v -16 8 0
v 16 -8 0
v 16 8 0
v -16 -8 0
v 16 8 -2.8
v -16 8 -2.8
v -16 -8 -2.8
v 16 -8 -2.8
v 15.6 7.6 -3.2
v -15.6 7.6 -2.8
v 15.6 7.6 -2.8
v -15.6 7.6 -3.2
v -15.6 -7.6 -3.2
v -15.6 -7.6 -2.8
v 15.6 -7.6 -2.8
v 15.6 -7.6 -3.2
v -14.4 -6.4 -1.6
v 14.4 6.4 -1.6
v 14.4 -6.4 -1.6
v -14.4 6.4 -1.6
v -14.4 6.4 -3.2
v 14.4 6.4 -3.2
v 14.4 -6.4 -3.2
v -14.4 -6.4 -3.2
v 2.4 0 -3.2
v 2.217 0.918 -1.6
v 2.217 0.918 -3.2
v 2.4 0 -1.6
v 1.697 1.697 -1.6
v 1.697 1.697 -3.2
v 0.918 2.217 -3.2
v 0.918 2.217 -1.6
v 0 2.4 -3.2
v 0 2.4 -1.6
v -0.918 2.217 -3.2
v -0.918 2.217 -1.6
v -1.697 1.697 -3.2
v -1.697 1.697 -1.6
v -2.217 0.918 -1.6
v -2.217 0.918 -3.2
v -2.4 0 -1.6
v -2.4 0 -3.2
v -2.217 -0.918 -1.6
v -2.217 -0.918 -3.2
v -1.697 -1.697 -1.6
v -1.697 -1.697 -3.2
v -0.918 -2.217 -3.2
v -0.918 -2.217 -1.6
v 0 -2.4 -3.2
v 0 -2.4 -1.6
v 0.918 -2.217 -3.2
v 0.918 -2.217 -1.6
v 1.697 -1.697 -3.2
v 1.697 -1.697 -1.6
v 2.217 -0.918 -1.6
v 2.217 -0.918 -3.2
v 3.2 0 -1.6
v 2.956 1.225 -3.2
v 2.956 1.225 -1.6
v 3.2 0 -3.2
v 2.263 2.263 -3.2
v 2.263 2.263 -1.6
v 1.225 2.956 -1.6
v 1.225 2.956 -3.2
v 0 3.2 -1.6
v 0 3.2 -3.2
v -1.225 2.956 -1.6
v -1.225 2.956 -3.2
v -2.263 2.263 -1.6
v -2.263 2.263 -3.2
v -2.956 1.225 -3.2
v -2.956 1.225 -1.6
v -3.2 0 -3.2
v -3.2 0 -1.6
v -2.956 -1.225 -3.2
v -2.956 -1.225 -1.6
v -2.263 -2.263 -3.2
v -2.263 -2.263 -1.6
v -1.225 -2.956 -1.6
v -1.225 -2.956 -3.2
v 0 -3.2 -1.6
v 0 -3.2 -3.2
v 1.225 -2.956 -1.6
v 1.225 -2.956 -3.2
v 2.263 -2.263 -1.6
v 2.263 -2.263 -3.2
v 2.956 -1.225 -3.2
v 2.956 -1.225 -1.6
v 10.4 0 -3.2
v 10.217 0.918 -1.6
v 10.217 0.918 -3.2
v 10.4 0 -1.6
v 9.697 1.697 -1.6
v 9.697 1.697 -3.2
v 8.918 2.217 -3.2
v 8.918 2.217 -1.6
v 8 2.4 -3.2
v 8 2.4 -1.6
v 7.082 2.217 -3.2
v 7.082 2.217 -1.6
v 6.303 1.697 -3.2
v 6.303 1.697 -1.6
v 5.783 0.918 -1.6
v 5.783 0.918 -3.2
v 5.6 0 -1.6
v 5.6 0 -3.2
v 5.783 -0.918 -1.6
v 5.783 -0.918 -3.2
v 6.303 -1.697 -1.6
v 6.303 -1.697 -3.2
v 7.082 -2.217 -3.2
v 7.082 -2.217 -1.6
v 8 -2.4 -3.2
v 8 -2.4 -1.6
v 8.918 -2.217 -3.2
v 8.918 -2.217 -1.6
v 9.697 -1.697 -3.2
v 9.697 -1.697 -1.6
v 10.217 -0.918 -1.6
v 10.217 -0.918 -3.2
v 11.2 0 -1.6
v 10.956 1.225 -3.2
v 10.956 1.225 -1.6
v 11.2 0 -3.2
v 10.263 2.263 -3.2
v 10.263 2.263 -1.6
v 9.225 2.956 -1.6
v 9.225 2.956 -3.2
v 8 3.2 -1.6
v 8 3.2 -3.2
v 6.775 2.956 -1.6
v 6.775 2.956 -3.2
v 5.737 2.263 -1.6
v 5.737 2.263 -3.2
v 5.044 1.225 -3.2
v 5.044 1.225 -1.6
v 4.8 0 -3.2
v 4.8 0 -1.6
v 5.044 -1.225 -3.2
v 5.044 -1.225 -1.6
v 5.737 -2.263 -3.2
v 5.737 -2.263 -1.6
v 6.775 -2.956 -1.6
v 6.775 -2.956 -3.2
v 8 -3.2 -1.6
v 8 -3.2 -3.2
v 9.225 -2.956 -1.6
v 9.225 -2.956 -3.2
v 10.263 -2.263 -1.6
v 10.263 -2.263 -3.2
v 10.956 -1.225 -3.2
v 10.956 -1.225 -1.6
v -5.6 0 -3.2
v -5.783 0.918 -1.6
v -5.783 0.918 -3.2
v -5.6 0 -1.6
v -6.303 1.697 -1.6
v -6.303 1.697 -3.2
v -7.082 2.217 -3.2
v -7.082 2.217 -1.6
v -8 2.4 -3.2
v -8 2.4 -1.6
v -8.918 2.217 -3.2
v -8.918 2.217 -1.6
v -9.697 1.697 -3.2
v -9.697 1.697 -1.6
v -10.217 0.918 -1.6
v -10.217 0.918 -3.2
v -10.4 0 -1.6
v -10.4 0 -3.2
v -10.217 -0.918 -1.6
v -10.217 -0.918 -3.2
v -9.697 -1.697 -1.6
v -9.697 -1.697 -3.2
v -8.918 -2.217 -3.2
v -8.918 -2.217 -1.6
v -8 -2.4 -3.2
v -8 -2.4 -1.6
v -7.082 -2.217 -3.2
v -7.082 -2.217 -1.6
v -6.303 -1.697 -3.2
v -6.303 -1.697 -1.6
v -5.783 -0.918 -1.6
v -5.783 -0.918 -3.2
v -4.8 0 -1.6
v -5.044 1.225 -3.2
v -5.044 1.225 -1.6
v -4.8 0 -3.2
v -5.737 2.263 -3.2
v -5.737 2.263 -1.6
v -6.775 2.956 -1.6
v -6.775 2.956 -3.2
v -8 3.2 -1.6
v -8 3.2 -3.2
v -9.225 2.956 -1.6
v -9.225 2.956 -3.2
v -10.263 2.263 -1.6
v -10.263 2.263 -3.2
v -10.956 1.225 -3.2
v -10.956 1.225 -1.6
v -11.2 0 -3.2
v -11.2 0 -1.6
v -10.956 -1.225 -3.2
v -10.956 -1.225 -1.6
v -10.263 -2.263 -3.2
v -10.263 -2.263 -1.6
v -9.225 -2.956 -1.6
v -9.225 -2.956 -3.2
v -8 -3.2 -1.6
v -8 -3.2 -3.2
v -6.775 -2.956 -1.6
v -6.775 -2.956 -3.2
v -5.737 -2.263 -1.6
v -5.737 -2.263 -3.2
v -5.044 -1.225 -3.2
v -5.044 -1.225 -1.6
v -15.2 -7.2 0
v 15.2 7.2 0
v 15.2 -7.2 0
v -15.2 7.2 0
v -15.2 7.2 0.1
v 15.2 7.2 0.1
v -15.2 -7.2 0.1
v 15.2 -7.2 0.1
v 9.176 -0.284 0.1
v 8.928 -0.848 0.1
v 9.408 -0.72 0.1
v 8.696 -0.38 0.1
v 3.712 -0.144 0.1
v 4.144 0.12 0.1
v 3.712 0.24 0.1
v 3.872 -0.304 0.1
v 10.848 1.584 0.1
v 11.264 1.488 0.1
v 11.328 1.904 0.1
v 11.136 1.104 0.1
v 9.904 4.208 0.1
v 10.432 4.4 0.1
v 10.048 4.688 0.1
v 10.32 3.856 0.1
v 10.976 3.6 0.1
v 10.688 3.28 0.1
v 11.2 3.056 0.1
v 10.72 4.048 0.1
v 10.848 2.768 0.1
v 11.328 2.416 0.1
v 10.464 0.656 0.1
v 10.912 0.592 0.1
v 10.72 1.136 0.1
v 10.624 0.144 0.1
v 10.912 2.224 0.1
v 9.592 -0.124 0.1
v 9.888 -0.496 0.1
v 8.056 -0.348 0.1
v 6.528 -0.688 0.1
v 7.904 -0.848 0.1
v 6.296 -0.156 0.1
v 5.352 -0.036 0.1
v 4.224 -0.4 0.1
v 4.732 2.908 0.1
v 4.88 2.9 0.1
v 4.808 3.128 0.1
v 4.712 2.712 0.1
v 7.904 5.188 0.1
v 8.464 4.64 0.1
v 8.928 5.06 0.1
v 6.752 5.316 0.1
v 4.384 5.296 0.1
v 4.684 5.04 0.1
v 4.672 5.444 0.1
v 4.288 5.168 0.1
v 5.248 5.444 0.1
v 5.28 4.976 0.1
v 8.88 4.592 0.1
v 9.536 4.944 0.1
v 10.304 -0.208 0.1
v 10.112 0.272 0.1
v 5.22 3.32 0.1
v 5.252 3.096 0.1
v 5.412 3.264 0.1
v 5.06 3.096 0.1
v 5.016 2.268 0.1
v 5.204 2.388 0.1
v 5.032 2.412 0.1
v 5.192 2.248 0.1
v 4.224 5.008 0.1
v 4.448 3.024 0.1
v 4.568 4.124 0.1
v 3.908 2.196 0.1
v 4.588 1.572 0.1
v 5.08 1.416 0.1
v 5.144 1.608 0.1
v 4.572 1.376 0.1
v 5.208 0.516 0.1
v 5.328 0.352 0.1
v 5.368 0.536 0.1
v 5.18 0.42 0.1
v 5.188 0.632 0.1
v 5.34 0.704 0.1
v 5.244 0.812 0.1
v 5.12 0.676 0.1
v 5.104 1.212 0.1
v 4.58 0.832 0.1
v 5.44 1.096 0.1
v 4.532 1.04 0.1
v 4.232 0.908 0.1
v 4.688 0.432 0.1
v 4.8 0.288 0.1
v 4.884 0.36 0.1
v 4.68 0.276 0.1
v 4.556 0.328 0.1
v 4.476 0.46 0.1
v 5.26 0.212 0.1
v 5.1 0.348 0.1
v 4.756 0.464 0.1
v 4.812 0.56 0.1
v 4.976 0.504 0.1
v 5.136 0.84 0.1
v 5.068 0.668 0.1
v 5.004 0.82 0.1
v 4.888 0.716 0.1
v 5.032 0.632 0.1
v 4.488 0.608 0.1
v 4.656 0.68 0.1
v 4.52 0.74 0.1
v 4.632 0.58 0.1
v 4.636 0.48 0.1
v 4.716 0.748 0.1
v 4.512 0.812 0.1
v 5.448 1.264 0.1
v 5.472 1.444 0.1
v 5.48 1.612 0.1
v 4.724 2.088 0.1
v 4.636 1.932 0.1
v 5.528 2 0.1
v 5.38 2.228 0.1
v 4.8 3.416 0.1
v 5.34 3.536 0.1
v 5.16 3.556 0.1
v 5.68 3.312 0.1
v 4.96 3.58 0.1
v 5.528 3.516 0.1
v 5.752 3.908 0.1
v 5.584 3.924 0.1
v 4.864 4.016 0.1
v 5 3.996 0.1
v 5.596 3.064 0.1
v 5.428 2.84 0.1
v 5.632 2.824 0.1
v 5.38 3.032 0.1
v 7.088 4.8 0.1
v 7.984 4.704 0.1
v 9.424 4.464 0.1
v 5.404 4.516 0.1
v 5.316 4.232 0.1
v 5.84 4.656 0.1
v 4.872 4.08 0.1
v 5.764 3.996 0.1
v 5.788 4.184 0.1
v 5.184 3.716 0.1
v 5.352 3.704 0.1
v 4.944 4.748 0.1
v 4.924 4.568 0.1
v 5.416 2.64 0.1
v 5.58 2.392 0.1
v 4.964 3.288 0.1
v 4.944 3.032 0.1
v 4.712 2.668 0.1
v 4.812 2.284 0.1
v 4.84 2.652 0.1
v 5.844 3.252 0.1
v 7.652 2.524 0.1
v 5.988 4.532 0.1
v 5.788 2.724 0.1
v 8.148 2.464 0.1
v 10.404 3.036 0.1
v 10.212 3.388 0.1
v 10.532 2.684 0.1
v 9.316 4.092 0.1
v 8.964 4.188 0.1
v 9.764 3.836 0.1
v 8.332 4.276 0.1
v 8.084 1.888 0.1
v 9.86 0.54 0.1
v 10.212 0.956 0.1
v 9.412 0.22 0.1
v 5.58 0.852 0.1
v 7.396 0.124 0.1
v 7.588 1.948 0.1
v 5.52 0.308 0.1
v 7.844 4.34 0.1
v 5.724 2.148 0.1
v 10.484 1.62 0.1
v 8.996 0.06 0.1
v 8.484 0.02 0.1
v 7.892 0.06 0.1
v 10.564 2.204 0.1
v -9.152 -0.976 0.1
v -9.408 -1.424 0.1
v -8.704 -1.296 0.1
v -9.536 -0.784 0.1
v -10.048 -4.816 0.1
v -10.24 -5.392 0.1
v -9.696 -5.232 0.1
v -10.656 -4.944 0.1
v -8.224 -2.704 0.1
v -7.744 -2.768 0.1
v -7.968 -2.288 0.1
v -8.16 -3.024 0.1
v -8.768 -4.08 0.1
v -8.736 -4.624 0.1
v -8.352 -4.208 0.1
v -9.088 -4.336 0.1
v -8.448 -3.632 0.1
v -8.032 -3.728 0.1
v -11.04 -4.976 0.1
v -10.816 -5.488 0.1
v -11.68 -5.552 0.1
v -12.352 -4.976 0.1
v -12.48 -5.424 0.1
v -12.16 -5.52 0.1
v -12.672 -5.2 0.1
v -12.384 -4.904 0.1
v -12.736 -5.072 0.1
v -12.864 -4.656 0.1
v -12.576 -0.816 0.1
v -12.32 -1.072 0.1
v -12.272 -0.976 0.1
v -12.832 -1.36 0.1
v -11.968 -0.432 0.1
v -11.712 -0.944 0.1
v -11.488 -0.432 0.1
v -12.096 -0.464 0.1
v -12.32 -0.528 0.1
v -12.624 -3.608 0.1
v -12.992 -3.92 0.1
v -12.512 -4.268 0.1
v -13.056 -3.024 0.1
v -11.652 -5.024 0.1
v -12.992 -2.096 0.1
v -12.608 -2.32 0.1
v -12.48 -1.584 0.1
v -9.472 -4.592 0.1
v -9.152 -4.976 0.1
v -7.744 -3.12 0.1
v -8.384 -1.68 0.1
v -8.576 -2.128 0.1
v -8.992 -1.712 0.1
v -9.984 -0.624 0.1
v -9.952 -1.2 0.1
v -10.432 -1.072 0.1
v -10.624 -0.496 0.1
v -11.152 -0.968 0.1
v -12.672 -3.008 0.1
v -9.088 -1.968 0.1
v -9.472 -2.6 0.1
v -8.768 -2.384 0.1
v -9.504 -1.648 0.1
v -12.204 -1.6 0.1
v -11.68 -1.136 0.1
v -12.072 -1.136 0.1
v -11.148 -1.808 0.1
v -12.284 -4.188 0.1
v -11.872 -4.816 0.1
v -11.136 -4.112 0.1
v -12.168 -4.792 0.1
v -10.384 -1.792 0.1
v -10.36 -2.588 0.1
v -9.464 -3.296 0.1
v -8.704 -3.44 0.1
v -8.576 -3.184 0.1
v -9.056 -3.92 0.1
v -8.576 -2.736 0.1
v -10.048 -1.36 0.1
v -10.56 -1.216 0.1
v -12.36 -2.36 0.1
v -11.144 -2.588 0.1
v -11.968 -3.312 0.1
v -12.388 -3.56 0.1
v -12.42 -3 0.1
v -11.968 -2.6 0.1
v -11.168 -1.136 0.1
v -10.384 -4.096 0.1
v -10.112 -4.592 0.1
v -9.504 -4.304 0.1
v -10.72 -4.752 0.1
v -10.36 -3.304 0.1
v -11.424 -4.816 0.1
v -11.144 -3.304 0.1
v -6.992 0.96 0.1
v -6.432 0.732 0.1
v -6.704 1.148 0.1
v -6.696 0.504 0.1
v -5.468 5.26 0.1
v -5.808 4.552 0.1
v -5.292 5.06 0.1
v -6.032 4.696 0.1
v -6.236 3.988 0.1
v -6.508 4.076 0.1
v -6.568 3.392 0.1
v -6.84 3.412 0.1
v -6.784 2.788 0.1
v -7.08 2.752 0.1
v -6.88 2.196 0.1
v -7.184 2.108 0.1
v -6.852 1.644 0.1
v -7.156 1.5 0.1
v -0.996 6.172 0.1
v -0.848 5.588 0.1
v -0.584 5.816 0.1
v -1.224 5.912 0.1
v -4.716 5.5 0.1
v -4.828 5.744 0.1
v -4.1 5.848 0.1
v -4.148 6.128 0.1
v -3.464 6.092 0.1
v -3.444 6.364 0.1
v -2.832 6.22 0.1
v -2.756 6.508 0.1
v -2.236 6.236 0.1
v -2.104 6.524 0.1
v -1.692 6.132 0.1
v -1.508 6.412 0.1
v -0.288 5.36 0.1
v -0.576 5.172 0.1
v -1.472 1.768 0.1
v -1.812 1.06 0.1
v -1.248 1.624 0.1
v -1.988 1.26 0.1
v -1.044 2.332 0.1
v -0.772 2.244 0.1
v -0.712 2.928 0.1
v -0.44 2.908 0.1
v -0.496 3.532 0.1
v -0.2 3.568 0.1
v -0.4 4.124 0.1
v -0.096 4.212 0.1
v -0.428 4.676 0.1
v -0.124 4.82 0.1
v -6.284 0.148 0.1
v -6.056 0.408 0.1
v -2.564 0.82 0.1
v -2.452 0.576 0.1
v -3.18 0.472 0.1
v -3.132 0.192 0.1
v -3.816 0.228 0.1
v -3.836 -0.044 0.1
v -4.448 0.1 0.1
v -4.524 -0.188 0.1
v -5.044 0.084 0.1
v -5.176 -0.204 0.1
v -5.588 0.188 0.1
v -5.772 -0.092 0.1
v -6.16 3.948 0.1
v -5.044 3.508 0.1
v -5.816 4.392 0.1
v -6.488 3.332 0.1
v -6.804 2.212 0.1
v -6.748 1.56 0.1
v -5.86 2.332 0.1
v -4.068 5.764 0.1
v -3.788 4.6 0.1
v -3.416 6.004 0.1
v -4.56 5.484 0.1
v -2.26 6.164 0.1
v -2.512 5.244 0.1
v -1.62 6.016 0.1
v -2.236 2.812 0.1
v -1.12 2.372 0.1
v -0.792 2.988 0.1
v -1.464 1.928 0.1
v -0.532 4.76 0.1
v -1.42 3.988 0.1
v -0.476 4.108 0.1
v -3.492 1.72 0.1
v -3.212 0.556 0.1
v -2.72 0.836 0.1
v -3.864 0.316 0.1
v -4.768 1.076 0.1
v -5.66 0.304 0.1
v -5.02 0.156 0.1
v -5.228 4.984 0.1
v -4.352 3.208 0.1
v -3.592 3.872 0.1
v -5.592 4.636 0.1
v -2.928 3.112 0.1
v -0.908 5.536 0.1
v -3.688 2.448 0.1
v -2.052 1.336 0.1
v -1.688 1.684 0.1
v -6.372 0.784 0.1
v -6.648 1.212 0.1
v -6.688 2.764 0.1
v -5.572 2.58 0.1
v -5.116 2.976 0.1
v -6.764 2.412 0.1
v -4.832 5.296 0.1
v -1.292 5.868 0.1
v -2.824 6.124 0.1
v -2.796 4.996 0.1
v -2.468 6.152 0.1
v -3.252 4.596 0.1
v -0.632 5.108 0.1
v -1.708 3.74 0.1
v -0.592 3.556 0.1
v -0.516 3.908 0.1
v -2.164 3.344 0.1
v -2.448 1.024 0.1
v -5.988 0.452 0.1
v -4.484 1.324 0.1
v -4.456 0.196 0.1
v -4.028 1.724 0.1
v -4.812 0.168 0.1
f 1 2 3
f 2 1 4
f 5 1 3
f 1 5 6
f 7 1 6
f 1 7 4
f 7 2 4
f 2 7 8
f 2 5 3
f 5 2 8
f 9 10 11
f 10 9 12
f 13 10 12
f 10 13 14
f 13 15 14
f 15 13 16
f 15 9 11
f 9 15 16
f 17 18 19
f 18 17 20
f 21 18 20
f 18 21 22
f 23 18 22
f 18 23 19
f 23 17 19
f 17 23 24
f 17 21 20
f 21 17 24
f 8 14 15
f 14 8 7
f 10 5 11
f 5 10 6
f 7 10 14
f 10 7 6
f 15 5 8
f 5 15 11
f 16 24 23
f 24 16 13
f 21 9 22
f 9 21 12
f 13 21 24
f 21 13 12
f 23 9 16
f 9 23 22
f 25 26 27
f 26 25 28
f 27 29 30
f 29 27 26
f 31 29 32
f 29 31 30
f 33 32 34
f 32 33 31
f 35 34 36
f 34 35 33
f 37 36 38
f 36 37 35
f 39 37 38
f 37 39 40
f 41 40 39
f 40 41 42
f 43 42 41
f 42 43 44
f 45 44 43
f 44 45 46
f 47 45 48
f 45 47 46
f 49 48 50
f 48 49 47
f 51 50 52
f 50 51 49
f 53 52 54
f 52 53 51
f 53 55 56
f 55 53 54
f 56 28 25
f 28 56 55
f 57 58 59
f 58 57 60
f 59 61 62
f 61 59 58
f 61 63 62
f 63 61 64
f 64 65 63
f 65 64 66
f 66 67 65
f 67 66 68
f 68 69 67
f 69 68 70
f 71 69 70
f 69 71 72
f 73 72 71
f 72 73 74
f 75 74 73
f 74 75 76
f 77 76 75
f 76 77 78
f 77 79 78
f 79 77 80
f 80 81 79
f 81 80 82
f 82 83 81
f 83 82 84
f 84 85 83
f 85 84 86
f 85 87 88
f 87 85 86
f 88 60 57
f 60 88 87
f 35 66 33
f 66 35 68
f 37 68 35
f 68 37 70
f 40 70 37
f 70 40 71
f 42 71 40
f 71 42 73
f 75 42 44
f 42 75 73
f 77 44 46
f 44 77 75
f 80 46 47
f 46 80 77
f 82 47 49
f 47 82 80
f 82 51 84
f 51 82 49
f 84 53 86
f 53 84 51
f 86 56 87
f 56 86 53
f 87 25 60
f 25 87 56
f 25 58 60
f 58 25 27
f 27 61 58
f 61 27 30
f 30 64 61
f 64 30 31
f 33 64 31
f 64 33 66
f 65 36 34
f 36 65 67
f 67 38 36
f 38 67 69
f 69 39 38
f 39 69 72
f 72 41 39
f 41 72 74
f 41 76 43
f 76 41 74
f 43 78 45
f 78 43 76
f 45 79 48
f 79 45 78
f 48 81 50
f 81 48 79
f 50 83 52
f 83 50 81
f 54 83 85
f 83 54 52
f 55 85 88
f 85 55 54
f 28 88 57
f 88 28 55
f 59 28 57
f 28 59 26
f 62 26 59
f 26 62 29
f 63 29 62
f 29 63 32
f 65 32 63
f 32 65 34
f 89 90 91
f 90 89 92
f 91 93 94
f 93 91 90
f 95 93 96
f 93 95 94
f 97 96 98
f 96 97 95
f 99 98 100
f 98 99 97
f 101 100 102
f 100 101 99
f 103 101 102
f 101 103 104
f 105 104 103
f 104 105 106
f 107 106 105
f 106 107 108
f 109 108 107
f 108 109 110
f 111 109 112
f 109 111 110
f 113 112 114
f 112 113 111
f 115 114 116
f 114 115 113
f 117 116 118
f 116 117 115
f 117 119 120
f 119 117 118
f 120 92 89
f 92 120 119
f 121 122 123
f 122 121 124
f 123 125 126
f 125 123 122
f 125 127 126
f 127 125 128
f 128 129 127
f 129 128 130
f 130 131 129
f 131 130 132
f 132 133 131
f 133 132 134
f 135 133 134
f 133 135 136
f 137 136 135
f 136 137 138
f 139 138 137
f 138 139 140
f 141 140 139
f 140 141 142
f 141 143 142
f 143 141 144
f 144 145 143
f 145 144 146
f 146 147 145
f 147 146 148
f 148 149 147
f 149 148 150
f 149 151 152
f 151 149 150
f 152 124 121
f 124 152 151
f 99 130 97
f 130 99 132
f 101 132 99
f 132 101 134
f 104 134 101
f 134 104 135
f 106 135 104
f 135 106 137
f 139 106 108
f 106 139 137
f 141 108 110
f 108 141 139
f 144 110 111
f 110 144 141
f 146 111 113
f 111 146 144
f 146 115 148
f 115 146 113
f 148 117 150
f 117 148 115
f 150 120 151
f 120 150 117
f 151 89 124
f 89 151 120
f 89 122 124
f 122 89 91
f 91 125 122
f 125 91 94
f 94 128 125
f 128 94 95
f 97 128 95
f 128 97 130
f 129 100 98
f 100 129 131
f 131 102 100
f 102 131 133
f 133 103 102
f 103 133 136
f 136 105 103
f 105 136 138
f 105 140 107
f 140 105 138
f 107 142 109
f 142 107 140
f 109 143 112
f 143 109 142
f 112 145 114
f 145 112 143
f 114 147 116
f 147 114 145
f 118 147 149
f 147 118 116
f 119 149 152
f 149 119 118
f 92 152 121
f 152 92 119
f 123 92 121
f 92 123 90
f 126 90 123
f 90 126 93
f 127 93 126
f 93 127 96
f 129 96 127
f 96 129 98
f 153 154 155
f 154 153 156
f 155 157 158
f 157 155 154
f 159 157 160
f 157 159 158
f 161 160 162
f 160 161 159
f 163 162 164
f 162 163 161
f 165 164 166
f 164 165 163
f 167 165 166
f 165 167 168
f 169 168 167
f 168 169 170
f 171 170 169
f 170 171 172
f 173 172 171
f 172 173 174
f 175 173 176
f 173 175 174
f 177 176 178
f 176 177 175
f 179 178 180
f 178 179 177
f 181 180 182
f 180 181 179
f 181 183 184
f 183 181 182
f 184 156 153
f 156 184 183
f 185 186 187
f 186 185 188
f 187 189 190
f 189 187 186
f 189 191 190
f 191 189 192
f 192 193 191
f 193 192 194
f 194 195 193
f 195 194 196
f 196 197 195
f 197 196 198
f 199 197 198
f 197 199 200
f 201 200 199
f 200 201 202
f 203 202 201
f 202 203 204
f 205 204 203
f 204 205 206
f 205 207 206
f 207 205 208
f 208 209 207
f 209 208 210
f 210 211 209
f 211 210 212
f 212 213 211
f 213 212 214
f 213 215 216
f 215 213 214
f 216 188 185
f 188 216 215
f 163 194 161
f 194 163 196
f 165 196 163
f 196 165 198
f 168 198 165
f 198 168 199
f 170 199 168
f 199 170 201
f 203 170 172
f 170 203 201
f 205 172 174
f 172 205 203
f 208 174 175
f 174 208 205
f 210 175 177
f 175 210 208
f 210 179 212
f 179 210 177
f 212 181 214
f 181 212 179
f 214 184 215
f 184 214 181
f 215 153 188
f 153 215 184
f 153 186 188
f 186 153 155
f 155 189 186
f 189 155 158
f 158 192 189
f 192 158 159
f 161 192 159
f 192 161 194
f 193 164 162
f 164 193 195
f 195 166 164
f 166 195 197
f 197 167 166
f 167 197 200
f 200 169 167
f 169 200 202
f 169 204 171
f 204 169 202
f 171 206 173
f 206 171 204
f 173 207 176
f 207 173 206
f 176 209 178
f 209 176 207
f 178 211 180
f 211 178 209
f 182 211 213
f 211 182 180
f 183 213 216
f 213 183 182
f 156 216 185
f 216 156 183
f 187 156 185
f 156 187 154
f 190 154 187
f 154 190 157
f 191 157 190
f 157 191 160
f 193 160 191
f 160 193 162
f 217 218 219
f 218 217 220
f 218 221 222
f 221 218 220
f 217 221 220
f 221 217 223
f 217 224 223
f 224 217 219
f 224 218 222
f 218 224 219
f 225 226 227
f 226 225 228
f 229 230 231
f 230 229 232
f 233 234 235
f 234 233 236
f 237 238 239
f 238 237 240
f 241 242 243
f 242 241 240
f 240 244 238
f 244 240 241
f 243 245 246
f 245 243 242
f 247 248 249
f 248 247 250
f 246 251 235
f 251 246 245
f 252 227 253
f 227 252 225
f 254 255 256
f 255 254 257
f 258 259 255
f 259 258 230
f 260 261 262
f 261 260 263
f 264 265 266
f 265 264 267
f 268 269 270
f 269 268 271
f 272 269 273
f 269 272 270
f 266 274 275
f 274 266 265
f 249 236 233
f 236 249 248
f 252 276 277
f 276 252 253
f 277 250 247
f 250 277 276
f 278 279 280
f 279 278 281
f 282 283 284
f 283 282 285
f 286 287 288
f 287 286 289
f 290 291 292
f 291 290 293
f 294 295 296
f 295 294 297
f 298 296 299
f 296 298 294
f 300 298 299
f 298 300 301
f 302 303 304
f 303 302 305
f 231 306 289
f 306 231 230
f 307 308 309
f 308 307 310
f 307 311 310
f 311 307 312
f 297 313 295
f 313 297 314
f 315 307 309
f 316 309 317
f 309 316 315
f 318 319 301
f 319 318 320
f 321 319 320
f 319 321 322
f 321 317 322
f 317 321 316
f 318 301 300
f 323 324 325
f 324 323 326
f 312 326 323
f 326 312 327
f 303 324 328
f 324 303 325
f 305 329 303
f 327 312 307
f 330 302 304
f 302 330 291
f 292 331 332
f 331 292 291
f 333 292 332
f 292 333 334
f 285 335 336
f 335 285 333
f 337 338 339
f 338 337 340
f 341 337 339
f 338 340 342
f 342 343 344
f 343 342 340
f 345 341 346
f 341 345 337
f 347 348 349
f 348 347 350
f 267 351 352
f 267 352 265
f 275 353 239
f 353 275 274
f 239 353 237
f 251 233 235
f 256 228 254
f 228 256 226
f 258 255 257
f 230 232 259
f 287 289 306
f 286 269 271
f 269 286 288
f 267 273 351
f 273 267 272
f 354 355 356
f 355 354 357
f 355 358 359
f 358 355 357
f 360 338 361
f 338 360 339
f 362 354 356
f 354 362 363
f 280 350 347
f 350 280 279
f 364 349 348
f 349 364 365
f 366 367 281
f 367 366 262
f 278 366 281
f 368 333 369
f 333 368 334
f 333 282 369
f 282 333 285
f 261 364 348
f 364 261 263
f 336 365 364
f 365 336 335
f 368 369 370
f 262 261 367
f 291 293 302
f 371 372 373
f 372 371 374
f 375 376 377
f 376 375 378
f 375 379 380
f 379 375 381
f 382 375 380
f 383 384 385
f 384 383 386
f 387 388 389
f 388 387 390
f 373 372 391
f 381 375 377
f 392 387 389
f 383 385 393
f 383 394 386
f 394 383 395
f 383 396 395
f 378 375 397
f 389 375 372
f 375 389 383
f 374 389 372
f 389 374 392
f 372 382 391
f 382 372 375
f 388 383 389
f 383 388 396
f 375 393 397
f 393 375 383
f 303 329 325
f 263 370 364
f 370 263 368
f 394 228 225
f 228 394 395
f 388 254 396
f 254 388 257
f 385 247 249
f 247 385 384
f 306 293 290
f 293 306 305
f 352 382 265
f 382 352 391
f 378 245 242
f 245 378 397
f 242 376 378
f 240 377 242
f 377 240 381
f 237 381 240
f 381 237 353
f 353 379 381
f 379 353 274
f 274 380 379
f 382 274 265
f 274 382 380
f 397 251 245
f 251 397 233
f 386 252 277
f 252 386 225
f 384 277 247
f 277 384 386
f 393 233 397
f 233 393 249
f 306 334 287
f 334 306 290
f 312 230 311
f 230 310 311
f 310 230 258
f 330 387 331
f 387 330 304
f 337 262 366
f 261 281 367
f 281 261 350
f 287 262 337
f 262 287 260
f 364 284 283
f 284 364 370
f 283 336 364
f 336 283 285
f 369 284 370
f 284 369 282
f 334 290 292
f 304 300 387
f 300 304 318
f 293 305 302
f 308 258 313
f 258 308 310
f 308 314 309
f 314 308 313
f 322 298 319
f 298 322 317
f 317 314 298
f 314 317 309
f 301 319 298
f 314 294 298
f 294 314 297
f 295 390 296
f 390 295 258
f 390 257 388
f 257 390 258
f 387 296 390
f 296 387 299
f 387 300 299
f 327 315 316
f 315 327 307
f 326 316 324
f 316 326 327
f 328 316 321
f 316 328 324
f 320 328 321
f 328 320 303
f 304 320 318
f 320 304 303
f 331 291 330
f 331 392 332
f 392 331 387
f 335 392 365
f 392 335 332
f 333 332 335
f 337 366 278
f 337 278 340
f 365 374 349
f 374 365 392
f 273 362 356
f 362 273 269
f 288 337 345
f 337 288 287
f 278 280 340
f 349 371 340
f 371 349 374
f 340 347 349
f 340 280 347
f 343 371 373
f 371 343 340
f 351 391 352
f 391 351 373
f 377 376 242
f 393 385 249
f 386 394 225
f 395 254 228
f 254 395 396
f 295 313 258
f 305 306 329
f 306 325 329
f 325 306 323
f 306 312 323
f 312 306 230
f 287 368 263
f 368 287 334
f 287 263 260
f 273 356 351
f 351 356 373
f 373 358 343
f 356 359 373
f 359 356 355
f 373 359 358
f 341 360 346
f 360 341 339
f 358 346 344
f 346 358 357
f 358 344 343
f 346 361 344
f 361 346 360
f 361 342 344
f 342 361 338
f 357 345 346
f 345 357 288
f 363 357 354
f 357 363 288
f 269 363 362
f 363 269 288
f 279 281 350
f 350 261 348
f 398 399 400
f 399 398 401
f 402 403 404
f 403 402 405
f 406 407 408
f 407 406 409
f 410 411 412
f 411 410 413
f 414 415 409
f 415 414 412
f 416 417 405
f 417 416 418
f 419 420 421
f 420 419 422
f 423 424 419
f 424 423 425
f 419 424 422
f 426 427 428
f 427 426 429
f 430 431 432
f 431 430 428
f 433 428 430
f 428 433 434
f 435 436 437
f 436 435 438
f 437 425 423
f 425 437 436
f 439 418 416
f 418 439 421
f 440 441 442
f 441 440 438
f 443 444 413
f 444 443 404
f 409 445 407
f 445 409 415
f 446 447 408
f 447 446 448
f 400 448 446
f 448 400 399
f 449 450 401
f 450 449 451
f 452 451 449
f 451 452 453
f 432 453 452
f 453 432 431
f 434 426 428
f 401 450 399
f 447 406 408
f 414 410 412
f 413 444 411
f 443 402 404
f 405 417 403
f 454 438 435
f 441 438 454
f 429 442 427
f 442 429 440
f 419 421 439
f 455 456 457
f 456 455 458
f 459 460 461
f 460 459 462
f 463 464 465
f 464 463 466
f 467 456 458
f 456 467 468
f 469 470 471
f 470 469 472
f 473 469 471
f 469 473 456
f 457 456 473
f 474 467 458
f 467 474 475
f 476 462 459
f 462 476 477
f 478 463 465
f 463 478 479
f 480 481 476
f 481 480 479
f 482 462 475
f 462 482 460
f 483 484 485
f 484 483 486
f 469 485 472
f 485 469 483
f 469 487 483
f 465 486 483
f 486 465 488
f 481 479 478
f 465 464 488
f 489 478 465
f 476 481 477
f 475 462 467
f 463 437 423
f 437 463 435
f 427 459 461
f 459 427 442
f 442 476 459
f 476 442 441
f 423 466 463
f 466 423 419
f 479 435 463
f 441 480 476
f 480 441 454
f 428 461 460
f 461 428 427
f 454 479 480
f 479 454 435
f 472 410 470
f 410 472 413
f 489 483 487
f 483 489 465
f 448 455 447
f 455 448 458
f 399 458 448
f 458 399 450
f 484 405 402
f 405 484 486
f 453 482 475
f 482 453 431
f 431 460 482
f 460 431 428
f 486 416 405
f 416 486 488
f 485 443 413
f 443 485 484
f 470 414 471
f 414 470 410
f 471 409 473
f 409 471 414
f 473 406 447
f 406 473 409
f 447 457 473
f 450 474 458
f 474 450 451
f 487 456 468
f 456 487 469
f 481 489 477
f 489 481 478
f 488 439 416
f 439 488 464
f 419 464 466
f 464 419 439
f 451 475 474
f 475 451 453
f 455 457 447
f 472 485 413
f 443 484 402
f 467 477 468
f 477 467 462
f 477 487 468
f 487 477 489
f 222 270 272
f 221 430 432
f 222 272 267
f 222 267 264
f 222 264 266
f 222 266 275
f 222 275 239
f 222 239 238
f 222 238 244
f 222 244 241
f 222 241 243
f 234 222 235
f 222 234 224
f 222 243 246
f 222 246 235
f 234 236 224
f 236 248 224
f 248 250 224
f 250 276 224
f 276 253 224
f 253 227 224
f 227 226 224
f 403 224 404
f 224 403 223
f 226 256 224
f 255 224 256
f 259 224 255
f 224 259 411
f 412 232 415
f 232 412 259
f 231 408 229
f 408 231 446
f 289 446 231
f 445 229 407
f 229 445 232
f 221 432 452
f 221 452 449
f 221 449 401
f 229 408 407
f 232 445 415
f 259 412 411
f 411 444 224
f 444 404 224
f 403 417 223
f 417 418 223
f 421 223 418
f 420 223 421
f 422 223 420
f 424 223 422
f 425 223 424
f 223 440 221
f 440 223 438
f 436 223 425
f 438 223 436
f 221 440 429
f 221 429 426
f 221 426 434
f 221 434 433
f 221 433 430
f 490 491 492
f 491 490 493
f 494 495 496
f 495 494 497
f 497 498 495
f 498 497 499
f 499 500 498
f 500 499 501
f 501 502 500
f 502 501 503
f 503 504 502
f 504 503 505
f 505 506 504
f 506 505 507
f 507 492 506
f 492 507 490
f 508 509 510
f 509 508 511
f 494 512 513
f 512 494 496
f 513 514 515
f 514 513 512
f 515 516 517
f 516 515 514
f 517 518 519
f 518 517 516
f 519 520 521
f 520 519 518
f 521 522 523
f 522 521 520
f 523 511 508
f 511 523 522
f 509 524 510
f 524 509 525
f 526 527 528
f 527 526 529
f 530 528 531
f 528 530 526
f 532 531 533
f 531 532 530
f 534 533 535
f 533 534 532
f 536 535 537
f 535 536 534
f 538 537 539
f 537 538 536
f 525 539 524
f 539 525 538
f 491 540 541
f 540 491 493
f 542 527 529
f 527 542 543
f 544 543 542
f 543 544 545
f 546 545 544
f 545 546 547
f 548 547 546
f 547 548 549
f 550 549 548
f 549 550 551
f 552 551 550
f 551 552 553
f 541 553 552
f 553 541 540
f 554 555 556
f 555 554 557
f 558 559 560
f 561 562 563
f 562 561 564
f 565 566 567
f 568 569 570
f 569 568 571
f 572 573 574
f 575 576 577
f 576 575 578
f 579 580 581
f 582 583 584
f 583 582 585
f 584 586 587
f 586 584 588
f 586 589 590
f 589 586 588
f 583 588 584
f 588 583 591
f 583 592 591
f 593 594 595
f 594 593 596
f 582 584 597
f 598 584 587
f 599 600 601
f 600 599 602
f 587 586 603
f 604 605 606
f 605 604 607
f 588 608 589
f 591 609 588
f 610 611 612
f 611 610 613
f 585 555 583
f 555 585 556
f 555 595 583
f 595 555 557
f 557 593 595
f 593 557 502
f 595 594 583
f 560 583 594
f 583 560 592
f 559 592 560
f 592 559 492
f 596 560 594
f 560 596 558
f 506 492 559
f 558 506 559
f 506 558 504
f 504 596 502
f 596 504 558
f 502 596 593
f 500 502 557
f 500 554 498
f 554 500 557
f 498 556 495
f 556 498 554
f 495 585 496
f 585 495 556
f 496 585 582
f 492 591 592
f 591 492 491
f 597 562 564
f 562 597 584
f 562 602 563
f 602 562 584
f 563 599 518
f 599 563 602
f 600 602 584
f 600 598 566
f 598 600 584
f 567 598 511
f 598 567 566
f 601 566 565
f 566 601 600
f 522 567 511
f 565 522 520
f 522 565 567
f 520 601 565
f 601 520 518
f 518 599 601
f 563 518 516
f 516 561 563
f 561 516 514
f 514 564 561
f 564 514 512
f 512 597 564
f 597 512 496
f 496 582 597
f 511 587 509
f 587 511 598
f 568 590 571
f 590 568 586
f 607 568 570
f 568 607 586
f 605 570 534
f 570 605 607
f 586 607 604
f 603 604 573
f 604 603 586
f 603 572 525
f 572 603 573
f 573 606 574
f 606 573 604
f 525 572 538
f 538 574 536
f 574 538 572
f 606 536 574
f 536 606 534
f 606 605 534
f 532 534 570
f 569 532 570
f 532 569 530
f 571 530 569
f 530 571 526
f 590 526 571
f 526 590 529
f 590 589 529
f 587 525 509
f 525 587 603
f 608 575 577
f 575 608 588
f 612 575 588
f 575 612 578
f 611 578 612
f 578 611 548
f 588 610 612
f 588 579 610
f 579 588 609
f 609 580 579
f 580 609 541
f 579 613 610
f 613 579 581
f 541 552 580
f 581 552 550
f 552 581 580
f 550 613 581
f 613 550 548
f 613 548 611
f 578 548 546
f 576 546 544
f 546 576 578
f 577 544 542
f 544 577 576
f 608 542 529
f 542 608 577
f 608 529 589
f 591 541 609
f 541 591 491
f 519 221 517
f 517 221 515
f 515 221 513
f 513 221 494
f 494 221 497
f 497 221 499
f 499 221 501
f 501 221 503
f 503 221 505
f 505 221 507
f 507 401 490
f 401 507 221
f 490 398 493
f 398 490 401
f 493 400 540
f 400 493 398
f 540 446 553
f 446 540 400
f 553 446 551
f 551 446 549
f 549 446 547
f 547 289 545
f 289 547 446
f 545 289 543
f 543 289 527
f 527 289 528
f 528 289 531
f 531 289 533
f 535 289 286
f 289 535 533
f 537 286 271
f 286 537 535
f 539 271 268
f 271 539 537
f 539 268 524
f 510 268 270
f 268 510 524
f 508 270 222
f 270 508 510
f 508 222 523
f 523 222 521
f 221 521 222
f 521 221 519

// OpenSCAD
use <../lib.scad>
use <6372023a.scad>
use <87079.scad>
function ldraw_lib__87079d1a() = [
// 0 Tile  2 x  4 with Switzerland, Sweden and UK Stickers on Medium Nougat Background Sticker
// 0 Name: 87079d1a.dat
// 0 Author: Vincent Messenet [Cheenzo]
// 0 !LDRAW_ORG Shortcut UPDATE 2026-07
// 0 !LICENSE Licensed under CC BY 4.0 : see CAreadme.txt
// 
// 0 BFC CERTIFY CCW
  [0,"BFC","CERTIFY"],
  [0,"BFC","CCW"],
// 
// 0 !CATEGORY Sticker Shortcut
// 0 !KEYWORDS Bricklink 87079pb1091, Fiat 500, set 77942
// 
// 0 !HISTORY 2026-07-30 [OrionP] Official Update 2026-07
// 
// 1 16 0 0 0 1 0 0 0 1 0 0 0 1 87079.dat
  [1,16,0,0,0,1,0,0,0,1,0,0,0,1, ldraw_lib__87079()],
// 1 16 0 0 0 1 0 0 0 1 0 0 0 1 6372023a.dat
  [1,16,0,0,0,1,0,0,0,1,0,0,0,1, ldraw_lib__6372023a()],
];
module ldraw_lib__87079d1a(step=0, col=false, unit=2/5, alt=false, line=0.2, solid=!$preview)
    makepoly(ldraw_lib__87079d1a(), step=step, col=col, unit=unit, alt=alt, line=line, solid=solid);
ldraw_lib__87079d1a(line=0.2);
